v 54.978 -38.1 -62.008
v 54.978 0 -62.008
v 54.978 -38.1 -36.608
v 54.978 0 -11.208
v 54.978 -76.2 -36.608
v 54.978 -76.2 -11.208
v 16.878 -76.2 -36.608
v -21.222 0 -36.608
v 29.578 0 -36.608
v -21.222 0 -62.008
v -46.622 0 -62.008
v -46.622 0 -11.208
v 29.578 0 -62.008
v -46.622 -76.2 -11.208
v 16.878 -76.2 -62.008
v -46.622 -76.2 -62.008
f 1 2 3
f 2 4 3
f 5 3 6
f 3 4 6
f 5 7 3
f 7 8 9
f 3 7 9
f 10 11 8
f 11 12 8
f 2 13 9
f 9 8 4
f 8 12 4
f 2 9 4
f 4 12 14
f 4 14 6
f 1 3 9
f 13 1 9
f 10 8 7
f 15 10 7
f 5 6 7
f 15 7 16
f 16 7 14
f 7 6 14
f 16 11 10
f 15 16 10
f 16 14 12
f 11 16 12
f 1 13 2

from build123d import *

# Parameters (mm, degrees)
F0_W     = 101.6
F0_H     = 25.4
F1_DEPTH = 76.2
F3_DEPTH = 25.4
F5_DEPTH = 25.4


with BuildPart() as f1:
    # F0 (on Front) → F1 (new body)
    with BuildSketch(Plane.XZ):
        with Locations((4.17847, -23.908158)):
            Rectangle(F0_W, F0_H)
    extrude(amount=F1_DEPTH)

    # F2 (on face) → F3 (join)
    with BuildSketch(Plane(origin=(0, 0, -36.608158), x_dir=(1, 0, 0), z_dir=(0, 0, -1))):
        Polygon((29.57847, 0), (54.97847, 0), (54.97847, 38.1), align=None)
    extrude(amount=F3_DEPTH)

    # F4 (on face) → F5 (join)
    with BuildSketch(Plane(origin=(0, 0, -36.608158), x_dir=(1, 0, 0), z_dir=(0, 0, -1))):
        Polygon((-46.62153, 76.2), (-46.62153, 0), (-21.22153, 0), (16.87847, 76.2), align=None)
    extrude(amount=F5_DEPTH)


solid = f1.part
